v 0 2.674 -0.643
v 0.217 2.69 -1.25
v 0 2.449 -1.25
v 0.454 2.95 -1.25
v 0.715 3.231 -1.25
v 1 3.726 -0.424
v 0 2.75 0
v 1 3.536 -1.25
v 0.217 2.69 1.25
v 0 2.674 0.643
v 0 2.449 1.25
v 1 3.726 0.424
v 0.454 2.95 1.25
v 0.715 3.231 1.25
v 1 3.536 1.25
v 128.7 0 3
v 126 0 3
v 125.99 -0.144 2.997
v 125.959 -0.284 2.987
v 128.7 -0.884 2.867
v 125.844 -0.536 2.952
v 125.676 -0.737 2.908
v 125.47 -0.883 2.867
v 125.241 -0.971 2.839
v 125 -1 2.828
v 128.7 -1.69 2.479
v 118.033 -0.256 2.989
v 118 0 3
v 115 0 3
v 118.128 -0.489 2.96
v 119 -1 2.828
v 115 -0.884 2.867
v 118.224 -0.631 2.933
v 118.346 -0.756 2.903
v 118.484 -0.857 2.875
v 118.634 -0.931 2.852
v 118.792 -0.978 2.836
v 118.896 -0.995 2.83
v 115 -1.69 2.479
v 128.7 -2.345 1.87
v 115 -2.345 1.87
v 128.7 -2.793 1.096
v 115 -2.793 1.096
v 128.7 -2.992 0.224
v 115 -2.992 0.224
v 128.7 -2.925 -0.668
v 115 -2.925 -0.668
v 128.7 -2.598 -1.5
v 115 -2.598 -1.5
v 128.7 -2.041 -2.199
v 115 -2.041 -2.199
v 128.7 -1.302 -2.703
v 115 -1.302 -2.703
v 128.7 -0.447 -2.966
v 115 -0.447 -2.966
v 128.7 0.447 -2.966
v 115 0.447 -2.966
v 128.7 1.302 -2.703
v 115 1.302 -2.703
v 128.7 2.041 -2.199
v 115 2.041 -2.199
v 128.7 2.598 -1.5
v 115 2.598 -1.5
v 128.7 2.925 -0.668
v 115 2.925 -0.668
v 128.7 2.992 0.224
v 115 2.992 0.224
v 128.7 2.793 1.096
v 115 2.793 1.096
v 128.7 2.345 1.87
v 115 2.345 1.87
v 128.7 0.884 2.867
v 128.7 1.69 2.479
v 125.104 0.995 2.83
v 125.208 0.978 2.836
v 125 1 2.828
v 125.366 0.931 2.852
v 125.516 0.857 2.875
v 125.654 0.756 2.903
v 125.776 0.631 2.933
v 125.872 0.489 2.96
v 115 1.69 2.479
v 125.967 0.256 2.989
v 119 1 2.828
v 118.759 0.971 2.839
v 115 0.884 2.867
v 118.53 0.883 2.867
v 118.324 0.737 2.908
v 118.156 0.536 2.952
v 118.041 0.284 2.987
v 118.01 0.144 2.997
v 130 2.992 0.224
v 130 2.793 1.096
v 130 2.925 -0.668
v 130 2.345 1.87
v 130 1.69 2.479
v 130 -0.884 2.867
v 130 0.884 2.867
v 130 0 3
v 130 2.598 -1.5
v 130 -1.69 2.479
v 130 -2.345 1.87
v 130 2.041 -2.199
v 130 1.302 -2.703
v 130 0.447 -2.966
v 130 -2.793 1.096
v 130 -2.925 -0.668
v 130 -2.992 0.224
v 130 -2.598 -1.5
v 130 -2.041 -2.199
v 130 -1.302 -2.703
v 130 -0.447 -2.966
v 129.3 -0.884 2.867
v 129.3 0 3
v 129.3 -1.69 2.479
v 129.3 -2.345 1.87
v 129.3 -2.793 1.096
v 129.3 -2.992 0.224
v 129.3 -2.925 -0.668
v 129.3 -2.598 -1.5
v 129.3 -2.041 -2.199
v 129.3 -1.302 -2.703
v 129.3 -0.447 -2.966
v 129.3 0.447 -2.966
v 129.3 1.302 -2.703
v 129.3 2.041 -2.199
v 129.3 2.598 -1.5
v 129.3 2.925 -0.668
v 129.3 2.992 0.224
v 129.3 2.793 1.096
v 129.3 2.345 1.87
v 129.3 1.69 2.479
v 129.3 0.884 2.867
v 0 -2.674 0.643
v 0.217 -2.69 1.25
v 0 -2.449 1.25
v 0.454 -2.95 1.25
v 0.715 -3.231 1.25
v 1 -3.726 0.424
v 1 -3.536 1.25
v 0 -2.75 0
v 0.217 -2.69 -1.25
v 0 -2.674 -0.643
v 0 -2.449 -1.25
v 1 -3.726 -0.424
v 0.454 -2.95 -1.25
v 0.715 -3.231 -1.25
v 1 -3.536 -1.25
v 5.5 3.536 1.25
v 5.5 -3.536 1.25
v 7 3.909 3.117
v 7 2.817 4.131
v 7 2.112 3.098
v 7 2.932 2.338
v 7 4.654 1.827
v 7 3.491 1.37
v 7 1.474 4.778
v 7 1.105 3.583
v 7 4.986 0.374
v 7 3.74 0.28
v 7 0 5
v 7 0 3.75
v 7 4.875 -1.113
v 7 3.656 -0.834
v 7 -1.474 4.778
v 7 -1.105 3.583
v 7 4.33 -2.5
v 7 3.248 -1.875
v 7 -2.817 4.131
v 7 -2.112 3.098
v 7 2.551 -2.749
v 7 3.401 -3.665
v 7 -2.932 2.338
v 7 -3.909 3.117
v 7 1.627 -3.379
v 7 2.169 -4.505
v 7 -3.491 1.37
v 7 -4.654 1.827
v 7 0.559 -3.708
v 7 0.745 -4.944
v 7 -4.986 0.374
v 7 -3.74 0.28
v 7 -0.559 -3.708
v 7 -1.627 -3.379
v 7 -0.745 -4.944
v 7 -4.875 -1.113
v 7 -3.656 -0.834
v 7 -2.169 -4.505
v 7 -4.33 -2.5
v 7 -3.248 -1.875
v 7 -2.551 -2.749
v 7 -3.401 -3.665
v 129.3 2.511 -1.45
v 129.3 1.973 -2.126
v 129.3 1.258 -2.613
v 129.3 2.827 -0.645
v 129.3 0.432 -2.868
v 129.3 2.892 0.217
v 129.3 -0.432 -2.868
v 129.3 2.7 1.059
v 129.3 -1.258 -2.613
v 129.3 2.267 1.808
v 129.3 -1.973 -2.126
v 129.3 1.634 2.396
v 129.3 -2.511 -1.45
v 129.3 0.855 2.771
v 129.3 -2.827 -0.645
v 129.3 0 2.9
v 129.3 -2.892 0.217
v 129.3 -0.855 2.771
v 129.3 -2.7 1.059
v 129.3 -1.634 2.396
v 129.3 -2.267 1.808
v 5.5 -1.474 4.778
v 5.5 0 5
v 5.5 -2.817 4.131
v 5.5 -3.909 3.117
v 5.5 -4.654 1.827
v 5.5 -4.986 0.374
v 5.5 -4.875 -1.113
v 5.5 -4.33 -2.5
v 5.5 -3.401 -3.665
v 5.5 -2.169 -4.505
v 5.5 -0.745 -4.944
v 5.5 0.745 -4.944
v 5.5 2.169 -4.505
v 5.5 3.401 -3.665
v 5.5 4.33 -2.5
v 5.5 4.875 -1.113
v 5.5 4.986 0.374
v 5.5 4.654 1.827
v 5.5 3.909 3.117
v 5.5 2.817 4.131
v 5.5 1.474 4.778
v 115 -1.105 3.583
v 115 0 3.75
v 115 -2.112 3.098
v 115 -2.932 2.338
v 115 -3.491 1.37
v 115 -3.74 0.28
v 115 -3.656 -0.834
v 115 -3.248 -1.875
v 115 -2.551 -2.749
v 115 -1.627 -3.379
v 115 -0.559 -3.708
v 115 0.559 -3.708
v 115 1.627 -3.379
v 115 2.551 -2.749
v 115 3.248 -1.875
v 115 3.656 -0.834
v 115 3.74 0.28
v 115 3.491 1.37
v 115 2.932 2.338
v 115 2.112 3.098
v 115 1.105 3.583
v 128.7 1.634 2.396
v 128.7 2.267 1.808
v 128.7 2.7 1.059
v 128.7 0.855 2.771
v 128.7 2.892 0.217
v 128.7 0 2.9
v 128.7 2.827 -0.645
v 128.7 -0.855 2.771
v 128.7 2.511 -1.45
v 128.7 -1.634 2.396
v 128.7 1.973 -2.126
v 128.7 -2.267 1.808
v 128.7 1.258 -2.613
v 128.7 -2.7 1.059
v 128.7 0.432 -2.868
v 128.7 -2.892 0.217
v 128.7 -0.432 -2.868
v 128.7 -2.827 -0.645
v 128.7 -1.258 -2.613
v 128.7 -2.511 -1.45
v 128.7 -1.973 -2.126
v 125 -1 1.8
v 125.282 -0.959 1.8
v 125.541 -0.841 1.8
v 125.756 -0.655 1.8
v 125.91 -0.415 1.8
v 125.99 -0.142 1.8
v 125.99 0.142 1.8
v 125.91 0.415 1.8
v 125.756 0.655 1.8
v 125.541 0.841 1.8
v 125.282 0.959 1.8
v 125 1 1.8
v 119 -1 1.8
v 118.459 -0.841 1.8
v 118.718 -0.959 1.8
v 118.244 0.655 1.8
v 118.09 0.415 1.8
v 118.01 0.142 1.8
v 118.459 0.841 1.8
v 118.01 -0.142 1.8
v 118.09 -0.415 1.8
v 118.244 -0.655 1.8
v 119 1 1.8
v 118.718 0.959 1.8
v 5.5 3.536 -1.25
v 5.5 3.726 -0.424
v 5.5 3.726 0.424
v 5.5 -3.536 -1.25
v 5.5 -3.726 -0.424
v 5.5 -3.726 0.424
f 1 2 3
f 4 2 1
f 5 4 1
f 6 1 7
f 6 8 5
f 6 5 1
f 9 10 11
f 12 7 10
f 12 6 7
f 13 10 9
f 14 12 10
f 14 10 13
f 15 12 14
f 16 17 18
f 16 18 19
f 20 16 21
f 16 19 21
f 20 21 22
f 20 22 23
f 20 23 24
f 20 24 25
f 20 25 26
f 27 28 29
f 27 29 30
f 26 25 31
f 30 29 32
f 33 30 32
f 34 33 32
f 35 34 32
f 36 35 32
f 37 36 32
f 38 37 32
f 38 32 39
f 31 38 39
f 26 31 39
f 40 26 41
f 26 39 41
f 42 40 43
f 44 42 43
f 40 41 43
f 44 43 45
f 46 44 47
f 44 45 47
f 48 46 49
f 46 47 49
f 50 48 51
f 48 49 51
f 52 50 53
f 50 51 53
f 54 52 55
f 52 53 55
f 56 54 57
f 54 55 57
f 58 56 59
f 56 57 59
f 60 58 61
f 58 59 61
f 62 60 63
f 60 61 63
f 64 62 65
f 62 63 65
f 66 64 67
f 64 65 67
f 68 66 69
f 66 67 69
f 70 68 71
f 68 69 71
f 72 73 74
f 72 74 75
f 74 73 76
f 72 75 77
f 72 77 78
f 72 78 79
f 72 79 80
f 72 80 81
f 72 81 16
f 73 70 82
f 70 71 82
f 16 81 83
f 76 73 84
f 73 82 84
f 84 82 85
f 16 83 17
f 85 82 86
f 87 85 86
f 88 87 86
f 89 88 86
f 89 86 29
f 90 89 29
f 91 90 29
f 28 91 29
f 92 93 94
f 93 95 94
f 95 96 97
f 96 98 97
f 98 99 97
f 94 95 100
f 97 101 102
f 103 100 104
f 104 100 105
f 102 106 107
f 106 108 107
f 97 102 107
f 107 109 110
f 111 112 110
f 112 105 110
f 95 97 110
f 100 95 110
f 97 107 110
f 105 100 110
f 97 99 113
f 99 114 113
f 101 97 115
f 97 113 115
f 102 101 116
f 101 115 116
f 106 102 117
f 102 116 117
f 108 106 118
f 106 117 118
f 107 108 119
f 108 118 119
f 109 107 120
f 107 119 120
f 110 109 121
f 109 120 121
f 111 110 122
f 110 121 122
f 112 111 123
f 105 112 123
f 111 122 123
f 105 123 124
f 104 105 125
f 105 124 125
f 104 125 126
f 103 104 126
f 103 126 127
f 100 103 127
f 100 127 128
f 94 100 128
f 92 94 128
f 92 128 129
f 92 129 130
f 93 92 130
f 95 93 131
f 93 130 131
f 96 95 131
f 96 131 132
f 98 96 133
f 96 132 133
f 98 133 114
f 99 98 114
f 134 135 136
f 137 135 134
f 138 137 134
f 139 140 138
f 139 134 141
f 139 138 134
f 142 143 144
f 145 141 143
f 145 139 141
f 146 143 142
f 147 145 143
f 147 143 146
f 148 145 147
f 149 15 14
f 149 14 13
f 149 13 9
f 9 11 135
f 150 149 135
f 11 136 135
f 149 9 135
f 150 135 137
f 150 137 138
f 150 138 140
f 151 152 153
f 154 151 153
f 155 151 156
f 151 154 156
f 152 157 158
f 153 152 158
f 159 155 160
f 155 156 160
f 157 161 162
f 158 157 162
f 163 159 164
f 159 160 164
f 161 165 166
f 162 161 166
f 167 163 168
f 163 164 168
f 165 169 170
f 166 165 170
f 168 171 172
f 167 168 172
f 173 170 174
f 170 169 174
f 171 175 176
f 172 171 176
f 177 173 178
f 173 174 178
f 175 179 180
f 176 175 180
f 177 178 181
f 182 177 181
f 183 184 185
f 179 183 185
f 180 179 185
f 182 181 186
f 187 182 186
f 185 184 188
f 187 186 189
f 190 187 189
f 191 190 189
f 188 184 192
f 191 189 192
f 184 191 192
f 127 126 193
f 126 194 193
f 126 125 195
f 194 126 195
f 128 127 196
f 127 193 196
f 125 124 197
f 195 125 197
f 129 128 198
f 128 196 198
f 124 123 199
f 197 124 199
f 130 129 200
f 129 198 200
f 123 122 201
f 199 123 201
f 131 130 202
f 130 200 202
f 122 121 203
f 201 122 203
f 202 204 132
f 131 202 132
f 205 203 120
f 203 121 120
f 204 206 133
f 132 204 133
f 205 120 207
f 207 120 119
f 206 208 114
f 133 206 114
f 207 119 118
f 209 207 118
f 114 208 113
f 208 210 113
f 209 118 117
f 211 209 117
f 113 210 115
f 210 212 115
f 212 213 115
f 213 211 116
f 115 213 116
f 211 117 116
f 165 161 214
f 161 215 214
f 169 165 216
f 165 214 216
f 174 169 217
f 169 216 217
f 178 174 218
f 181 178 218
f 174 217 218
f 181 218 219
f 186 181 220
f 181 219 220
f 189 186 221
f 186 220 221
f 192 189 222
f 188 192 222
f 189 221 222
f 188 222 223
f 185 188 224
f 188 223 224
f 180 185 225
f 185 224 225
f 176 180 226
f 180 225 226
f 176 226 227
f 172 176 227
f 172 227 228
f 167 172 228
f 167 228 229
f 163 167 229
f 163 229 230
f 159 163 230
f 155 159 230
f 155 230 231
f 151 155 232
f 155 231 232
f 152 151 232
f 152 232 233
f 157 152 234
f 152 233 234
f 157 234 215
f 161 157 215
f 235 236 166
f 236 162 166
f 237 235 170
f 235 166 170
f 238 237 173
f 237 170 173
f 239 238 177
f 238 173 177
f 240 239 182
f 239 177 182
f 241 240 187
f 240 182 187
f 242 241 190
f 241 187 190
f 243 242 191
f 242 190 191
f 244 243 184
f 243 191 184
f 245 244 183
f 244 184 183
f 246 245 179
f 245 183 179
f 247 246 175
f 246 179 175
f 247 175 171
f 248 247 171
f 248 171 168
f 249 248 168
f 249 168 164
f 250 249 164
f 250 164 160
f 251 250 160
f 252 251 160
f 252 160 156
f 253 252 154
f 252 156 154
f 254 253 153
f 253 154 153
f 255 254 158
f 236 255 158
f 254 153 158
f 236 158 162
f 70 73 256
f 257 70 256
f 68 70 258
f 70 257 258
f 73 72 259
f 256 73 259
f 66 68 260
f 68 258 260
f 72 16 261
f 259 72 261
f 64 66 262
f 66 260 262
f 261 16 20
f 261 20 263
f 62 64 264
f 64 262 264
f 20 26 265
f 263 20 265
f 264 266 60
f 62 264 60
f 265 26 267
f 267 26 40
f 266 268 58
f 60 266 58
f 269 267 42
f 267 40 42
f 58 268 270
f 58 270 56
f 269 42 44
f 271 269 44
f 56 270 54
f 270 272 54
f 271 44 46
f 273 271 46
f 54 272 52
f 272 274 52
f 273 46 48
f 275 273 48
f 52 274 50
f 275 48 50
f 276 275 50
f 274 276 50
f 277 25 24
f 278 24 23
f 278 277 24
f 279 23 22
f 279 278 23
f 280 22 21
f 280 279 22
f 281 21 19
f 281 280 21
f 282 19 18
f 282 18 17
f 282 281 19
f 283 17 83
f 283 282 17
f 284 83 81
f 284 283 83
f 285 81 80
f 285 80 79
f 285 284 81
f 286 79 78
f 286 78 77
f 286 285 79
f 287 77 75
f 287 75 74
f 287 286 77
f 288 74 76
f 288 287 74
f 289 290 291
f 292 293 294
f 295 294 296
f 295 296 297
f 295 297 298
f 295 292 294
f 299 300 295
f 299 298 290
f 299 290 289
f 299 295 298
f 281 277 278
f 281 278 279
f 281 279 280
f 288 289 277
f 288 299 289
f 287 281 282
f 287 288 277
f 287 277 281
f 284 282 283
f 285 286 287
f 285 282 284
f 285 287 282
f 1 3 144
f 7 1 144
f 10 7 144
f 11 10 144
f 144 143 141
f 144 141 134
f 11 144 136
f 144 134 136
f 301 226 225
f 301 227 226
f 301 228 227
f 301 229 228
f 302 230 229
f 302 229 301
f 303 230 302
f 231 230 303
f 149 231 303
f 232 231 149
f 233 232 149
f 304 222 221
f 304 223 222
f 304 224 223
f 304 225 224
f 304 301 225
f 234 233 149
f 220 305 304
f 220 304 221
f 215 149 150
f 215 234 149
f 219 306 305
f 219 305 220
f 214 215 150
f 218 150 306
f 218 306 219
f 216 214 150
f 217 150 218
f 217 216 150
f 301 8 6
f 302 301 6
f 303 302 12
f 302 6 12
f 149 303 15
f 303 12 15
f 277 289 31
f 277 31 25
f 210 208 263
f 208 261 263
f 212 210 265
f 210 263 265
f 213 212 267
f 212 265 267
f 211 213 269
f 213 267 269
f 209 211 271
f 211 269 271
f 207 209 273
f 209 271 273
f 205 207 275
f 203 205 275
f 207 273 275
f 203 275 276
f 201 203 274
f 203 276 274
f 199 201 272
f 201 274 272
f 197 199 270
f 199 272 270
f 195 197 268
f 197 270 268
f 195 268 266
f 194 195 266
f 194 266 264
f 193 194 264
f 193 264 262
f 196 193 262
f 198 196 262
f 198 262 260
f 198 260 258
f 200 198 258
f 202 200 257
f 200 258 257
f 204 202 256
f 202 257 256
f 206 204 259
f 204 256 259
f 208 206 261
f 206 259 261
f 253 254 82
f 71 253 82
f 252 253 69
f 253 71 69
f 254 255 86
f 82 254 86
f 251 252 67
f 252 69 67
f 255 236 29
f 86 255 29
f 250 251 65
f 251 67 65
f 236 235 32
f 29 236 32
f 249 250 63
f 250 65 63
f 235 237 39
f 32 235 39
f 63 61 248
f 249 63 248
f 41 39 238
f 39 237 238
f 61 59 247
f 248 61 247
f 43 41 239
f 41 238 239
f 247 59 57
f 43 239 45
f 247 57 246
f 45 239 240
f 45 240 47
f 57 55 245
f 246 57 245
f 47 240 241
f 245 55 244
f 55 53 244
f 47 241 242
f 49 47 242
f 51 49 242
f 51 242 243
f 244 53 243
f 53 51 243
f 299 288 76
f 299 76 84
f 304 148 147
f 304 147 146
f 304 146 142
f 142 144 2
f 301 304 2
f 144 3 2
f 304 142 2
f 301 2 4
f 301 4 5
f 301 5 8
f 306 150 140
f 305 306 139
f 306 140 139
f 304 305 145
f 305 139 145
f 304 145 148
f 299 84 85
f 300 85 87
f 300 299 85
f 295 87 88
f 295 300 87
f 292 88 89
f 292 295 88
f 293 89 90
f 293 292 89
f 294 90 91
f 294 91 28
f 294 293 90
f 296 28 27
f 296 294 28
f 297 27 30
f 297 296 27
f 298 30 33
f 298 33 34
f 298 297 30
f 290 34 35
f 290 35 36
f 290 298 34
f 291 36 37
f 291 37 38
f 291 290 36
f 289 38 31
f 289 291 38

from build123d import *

# Parameters (mm, degrees)
F2_SIZE  = 1
F4_DEPTH = 5.5
F7_DEPTH = 1.2


with BuildPart() as f1:
    # F0 (on Front) → F1 (revolve)
    with BuildSketch(Plane.XZ):
        Polygon((0, 3.75), (0, 0), (130, 0), (130, 3), (129.3, 3), (129.3, 2.9), (128.7, 2.9), (128.7, 3), (115, 3), (115, 3.75), (7, 3.75), (7, 5), (5.5, 5), (5.5, 3.75), align=None)
    revolve(axis=Axis((81.1427264533, 0, 0), (1, 0, 0)))

    # F2
    f2_edges = [f1.edges().sort_by_distance(p)[0] for p in [
        (0, 0, -3.75),
    ]]
    chamfer(f2_edges, length=F2_SIZE)

    # F3 (on face) → F4 (cut, through all)
    with BuildSketch(Plane(origin=(0, 0, 0), x_dir=(0, -1, 0), z_dir=(-1, 0, 0))):
        with BuildLine():
            Line((2.4494897428, 1.25), (3.5355339059, 1.25))
            ThreePointArc((3.5355339059, 1.25), (0, 3.75), (-3.5355339059, 1.25))
            Line((-3.5355339059, 1.25), (-2.4494897428, 1.25))
            ThreePointArc((-2.4494897428, 1.25), (0, 2.75), (2.4494897428, 1.25))
        make_face()
        with BuildLine():
            ThreePointArc((-3.5355339059, -1.25), (0, -3.75), (3.5355339059, -1.25))
            Line((3.5355339059, -1.25), (2.4494897428, -1.25))
            ThreePointArc((2.4494897428, -1.25), (0, -2.75), (-2.4494897428, -1.25))
            Line((-2.4494897428, -1.25), (-3.5355339059, -1.25))
        make_face()
        with BuildLine():
            Line((-2.4494897428, 1.25), (2.4494897428, 1.25))
            ThreePointArc((2.4494897428, 1.25), (0, 2.75), (-2.4494897428, 1.25))
        make_face()
        with BuildLine():
            ThreePointArc((-2.4494897428, -1.25), (0, -2.75), (2.4494897428, -1.25))
            Line((2.4494897428, -1.25), (-2.4494897428, -1.25))
        make_face()
    extrude(amount=-F4_DEPTH, mode=Mode.SUBTRACT)

    # F6 (on offset) → F7 (cut, through all)
    with BuildSketch(Plane.XY.offset(1.8)):
        with BuildLine():
            ThreePointArc((125, -1), (126, 0), (125, 1))
            Line((125, 1), (119, 1))
            ThreePointArc((119, 1), (118, 0), (119, -1))
            Line((119, -1), (125, -1))
        make_face()
    extrude(amount=F7_DEPTH, mode=Mode.SUBTRACT)


solid = f1.part
